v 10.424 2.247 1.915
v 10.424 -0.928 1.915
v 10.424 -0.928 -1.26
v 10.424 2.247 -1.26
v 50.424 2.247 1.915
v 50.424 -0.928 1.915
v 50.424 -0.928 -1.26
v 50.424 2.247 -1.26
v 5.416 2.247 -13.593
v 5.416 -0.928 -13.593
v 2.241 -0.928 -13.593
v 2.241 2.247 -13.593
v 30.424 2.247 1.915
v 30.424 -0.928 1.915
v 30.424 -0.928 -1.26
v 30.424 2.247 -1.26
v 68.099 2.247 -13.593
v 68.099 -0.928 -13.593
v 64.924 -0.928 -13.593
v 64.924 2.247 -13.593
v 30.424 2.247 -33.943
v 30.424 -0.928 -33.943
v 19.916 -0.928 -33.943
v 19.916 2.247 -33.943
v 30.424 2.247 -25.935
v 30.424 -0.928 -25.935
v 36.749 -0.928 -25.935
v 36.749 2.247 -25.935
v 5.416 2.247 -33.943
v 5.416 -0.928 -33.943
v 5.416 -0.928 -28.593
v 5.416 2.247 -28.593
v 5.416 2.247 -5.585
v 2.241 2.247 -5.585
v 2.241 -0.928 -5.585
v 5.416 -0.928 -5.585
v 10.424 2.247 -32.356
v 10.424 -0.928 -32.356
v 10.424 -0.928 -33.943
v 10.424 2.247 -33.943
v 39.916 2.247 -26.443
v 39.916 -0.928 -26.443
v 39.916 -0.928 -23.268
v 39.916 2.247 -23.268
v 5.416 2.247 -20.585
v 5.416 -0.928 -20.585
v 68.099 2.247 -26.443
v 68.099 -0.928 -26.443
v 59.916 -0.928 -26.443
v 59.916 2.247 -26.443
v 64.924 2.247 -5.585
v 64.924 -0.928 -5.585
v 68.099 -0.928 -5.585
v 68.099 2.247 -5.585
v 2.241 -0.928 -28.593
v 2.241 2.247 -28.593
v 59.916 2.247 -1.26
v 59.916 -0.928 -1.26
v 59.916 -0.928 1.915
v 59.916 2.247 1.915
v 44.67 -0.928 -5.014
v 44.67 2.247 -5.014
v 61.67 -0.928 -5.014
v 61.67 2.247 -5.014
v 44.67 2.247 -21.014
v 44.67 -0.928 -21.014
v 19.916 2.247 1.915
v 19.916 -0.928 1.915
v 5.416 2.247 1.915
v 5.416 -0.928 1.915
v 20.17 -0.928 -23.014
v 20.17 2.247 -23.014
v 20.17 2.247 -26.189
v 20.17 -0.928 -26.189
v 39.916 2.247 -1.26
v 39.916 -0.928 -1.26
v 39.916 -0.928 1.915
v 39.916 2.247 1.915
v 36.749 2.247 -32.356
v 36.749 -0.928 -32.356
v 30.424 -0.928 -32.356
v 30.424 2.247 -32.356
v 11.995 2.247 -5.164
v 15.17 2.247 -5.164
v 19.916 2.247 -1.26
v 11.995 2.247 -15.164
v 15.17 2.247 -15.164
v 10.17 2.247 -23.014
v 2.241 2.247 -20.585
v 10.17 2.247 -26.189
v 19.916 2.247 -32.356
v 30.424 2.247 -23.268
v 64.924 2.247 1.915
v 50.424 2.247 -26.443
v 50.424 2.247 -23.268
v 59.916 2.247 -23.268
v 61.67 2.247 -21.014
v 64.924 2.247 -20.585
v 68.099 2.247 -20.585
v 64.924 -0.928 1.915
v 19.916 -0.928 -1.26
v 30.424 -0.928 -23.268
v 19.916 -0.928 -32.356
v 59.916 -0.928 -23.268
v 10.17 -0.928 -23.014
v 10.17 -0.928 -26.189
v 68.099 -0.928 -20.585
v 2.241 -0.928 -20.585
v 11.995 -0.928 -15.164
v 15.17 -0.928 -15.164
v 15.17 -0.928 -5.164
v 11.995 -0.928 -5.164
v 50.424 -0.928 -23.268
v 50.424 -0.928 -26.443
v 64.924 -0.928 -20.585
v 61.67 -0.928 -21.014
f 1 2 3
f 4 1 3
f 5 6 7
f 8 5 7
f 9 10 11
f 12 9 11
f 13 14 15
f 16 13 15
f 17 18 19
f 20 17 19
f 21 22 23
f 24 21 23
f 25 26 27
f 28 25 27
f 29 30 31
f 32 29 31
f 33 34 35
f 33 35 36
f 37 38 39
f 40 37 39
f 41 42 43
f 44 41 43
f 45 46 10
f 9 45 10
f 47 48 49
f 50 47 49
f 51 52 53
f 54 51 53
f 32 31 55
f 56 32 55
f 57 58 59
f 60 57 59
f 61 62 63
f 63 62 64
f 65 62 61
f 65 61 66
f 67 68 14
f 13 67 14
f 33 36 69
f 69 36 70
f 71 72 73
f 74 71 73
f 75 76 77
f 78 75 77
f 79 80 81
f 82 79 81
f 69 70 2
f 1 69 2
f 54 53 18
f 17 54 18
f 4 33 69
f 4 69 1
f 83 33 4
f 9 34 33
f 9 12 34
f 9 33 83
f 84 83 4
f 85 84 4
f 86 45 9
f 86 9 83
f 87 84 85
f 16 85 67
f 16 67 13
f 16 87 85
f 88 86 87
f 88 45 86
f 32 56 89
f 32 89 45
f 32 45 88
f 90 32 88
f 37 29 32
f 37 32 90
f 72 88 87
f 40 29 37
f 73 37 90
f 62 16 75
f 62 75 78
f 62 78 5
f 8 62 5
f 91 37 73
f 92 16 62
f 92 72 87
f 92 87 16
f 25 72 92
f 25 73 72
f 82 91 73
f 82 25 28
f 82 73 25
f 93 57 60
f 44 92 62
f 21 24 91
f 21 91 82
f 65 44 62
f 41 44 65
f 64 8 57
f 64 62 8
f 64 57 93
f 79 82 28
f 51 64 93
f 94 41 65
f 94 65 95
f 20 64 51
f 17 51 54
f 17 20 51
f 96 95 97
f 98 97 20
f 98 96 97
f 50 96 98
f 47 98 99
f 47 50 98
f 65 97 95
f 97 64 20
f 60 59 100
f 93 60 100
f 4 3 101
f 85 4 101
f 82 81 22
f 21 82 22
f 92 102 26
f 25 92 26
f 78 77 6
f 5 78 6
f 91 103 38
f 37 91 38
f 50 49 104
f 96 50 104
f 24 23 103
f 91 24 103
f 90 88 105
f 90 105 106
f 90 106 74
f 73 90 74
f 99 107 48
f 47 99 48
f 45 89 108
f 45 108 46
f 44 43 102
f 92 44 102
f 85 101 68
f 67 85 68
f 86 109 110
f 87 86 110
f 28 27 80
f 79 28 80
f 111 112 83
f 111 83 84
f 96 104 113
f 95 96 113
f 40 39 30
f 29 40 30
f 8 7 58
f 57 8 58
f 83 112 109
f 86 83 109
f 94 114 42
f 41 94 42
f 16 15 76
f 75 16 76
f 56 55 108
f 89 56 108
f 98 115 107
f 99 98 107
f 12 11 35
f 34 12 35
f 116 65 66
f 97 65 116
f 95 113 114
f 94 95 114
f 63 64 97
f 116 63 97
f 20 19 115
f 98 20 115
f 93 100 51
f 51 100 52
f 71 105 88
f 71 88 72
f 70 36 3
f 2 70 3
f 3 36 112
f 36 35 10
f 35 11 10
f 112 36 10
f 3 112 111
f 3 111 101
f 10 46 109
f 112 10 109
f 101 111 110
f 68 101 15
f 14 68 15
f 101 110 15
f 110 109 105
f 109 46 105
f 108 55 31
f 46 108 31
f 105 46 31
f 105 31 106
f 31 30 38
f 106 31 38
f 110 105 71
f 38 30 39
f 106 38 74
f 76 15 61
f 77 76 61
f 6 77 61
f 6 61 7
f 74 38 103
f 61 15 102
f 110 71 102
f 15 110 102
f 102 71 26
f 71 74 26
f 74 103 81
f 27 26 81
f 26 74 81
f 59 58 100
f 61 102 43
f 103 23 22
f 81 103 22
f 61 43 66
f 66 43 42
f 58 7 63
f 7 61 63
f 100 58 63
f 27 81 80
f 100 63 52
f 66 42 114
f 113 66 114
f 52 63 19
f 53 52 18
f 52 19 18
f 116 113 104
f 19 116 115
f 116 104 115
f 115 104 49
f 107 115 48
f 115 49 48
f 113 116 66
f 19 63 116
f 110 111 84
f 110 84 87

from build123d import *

# Parameters (mm, degrees)
BOTTOM_START                  = -0.928285838
BOTTOM_SIDE_PIECE_OUTLINE_W   = 3.175
BOTTOM_SIDE_PIECE_OUTLINE_H   = 10
BOTTOM_SIDE_PIECE_OUTLINE_W_2 = 10
BOTTOM_SIDE_PIECE_OUTLINE_H_2 = 3.175
BOTTOM_SIDE_PIECE_DEPTH       = 3.175
SKETCH6_W                     = 17
SKETCH6_H                     = 16
CUT_EXTRUDE2_DEPTH            = 77.155702908


# Read off the part's stored shape, not the designer's step: Bottom Side Piece
with BuildPart() as part:
    # Bottom Side Piece outline → Bottom Side Piece (new body)
    with BuildSketch(Plane(origin=(0, 0, 0), x_dir=(1, 0, 0), z_dir=(0, 1, 0)).offset(BOTTOM_START)):
        Polygon((2.240974339, 5.585190103), (5.415974339, 5.585190103), (5.415974339, -1.914809897), (10.423974339, -1.914809897), (10.423974339, 1.260190103), (19.915974339, 1.260190103), (19.915974339, -1.914809897), (30.423974339, -1.914809897), (30.423974339, 1.260190103), (39.915974339, 1.260190103), (39.915974339, -1.914809897), (50.423974339, -1.914809897), (50.423974339, 1.260190103), (59.915974339, 1.260190103), (59.915974339, -1.914809897), (64.923974339, -1.914809897), (64.923974339, 5.585190103), (68.098974339, 5.585190103), (68.098974339, 13.593190103), (64.923974339, 13.593190103), (64.923974339, 20.585190103), (68.098974339, 20.585190103), (68.098974339, 26.443190103), (59.915974339, 26.443190103), (59.915974339, 23.268190103), (50.423974339, 23.268190103), (50.423974339, 26.443190103), (39.915974339, 26.443190103), (39.915974339, 23.268190103), (30.423974339, 23.268190103), (30.423974339, 25.935190103), (36.748974339, 25.935190103), (36.748974339, 32.355690103), (30.423974339, 32.355690103), (30.423974339, 33.943190103), (19.915974339, 33.943190103), (19.915974339, 32.355690103), (10.423974339, 32.355690103), (10.423974339, 33.943190103), (5.415974339, 33.943190103), (5.415974339, 28.593190103), (2.240974339, 28.593190103), (2.240974339, 20.585190103), (5.415974339, 20.585190103), (5.415974339, 13.593190103), (2.240974339, 13.593190103), align=None)
        with Locations((13.582474339, 10.164190103)):
            Rectangle(BOTTOM_SIDE_PIECE_OUTLINE_W, BOTTOM_SIDE_PIECE_OUTLINE_H, mode=Mode.SUBTRACT)
        with Locations((56.757474339, 10.164190103)):
            Rectangle(BOTTOM_SIDE_PIECE_OUTLINE_W, BOTTOM_SIDE_PIECE_OUTLINE_H, mode=Mode.SUBTRACT)
        with Locations((15.169974339, 24.601690103)):
            Rectangle(BOTTOM_SIDE_PIECE_OUTLINE_W_2, BOTTOM_SIDE_PIECE_OUTLINE_H_2, mode=Mode.SUBTRACT)
    extrude(amount=BOTTOM_SIDE_PIECE_DEPTH)

    # Sketch6 → Cut-Extrude2 (cut, through all)
    with BuildSketch(Plane(origin=(0, 2.246714162, 0), x_dir=(1, 0, 0), z_dir=(0, 1, 0))):
        with Locations((53.169974339, 13.014190103)):
            Rectangle(SKETCH6_W, SKETCH6_H)
    extrude(amount=-CUT_EXTRUDE2_DEPTH, mode=Mode.SUBTRACT)


solid = part.part
